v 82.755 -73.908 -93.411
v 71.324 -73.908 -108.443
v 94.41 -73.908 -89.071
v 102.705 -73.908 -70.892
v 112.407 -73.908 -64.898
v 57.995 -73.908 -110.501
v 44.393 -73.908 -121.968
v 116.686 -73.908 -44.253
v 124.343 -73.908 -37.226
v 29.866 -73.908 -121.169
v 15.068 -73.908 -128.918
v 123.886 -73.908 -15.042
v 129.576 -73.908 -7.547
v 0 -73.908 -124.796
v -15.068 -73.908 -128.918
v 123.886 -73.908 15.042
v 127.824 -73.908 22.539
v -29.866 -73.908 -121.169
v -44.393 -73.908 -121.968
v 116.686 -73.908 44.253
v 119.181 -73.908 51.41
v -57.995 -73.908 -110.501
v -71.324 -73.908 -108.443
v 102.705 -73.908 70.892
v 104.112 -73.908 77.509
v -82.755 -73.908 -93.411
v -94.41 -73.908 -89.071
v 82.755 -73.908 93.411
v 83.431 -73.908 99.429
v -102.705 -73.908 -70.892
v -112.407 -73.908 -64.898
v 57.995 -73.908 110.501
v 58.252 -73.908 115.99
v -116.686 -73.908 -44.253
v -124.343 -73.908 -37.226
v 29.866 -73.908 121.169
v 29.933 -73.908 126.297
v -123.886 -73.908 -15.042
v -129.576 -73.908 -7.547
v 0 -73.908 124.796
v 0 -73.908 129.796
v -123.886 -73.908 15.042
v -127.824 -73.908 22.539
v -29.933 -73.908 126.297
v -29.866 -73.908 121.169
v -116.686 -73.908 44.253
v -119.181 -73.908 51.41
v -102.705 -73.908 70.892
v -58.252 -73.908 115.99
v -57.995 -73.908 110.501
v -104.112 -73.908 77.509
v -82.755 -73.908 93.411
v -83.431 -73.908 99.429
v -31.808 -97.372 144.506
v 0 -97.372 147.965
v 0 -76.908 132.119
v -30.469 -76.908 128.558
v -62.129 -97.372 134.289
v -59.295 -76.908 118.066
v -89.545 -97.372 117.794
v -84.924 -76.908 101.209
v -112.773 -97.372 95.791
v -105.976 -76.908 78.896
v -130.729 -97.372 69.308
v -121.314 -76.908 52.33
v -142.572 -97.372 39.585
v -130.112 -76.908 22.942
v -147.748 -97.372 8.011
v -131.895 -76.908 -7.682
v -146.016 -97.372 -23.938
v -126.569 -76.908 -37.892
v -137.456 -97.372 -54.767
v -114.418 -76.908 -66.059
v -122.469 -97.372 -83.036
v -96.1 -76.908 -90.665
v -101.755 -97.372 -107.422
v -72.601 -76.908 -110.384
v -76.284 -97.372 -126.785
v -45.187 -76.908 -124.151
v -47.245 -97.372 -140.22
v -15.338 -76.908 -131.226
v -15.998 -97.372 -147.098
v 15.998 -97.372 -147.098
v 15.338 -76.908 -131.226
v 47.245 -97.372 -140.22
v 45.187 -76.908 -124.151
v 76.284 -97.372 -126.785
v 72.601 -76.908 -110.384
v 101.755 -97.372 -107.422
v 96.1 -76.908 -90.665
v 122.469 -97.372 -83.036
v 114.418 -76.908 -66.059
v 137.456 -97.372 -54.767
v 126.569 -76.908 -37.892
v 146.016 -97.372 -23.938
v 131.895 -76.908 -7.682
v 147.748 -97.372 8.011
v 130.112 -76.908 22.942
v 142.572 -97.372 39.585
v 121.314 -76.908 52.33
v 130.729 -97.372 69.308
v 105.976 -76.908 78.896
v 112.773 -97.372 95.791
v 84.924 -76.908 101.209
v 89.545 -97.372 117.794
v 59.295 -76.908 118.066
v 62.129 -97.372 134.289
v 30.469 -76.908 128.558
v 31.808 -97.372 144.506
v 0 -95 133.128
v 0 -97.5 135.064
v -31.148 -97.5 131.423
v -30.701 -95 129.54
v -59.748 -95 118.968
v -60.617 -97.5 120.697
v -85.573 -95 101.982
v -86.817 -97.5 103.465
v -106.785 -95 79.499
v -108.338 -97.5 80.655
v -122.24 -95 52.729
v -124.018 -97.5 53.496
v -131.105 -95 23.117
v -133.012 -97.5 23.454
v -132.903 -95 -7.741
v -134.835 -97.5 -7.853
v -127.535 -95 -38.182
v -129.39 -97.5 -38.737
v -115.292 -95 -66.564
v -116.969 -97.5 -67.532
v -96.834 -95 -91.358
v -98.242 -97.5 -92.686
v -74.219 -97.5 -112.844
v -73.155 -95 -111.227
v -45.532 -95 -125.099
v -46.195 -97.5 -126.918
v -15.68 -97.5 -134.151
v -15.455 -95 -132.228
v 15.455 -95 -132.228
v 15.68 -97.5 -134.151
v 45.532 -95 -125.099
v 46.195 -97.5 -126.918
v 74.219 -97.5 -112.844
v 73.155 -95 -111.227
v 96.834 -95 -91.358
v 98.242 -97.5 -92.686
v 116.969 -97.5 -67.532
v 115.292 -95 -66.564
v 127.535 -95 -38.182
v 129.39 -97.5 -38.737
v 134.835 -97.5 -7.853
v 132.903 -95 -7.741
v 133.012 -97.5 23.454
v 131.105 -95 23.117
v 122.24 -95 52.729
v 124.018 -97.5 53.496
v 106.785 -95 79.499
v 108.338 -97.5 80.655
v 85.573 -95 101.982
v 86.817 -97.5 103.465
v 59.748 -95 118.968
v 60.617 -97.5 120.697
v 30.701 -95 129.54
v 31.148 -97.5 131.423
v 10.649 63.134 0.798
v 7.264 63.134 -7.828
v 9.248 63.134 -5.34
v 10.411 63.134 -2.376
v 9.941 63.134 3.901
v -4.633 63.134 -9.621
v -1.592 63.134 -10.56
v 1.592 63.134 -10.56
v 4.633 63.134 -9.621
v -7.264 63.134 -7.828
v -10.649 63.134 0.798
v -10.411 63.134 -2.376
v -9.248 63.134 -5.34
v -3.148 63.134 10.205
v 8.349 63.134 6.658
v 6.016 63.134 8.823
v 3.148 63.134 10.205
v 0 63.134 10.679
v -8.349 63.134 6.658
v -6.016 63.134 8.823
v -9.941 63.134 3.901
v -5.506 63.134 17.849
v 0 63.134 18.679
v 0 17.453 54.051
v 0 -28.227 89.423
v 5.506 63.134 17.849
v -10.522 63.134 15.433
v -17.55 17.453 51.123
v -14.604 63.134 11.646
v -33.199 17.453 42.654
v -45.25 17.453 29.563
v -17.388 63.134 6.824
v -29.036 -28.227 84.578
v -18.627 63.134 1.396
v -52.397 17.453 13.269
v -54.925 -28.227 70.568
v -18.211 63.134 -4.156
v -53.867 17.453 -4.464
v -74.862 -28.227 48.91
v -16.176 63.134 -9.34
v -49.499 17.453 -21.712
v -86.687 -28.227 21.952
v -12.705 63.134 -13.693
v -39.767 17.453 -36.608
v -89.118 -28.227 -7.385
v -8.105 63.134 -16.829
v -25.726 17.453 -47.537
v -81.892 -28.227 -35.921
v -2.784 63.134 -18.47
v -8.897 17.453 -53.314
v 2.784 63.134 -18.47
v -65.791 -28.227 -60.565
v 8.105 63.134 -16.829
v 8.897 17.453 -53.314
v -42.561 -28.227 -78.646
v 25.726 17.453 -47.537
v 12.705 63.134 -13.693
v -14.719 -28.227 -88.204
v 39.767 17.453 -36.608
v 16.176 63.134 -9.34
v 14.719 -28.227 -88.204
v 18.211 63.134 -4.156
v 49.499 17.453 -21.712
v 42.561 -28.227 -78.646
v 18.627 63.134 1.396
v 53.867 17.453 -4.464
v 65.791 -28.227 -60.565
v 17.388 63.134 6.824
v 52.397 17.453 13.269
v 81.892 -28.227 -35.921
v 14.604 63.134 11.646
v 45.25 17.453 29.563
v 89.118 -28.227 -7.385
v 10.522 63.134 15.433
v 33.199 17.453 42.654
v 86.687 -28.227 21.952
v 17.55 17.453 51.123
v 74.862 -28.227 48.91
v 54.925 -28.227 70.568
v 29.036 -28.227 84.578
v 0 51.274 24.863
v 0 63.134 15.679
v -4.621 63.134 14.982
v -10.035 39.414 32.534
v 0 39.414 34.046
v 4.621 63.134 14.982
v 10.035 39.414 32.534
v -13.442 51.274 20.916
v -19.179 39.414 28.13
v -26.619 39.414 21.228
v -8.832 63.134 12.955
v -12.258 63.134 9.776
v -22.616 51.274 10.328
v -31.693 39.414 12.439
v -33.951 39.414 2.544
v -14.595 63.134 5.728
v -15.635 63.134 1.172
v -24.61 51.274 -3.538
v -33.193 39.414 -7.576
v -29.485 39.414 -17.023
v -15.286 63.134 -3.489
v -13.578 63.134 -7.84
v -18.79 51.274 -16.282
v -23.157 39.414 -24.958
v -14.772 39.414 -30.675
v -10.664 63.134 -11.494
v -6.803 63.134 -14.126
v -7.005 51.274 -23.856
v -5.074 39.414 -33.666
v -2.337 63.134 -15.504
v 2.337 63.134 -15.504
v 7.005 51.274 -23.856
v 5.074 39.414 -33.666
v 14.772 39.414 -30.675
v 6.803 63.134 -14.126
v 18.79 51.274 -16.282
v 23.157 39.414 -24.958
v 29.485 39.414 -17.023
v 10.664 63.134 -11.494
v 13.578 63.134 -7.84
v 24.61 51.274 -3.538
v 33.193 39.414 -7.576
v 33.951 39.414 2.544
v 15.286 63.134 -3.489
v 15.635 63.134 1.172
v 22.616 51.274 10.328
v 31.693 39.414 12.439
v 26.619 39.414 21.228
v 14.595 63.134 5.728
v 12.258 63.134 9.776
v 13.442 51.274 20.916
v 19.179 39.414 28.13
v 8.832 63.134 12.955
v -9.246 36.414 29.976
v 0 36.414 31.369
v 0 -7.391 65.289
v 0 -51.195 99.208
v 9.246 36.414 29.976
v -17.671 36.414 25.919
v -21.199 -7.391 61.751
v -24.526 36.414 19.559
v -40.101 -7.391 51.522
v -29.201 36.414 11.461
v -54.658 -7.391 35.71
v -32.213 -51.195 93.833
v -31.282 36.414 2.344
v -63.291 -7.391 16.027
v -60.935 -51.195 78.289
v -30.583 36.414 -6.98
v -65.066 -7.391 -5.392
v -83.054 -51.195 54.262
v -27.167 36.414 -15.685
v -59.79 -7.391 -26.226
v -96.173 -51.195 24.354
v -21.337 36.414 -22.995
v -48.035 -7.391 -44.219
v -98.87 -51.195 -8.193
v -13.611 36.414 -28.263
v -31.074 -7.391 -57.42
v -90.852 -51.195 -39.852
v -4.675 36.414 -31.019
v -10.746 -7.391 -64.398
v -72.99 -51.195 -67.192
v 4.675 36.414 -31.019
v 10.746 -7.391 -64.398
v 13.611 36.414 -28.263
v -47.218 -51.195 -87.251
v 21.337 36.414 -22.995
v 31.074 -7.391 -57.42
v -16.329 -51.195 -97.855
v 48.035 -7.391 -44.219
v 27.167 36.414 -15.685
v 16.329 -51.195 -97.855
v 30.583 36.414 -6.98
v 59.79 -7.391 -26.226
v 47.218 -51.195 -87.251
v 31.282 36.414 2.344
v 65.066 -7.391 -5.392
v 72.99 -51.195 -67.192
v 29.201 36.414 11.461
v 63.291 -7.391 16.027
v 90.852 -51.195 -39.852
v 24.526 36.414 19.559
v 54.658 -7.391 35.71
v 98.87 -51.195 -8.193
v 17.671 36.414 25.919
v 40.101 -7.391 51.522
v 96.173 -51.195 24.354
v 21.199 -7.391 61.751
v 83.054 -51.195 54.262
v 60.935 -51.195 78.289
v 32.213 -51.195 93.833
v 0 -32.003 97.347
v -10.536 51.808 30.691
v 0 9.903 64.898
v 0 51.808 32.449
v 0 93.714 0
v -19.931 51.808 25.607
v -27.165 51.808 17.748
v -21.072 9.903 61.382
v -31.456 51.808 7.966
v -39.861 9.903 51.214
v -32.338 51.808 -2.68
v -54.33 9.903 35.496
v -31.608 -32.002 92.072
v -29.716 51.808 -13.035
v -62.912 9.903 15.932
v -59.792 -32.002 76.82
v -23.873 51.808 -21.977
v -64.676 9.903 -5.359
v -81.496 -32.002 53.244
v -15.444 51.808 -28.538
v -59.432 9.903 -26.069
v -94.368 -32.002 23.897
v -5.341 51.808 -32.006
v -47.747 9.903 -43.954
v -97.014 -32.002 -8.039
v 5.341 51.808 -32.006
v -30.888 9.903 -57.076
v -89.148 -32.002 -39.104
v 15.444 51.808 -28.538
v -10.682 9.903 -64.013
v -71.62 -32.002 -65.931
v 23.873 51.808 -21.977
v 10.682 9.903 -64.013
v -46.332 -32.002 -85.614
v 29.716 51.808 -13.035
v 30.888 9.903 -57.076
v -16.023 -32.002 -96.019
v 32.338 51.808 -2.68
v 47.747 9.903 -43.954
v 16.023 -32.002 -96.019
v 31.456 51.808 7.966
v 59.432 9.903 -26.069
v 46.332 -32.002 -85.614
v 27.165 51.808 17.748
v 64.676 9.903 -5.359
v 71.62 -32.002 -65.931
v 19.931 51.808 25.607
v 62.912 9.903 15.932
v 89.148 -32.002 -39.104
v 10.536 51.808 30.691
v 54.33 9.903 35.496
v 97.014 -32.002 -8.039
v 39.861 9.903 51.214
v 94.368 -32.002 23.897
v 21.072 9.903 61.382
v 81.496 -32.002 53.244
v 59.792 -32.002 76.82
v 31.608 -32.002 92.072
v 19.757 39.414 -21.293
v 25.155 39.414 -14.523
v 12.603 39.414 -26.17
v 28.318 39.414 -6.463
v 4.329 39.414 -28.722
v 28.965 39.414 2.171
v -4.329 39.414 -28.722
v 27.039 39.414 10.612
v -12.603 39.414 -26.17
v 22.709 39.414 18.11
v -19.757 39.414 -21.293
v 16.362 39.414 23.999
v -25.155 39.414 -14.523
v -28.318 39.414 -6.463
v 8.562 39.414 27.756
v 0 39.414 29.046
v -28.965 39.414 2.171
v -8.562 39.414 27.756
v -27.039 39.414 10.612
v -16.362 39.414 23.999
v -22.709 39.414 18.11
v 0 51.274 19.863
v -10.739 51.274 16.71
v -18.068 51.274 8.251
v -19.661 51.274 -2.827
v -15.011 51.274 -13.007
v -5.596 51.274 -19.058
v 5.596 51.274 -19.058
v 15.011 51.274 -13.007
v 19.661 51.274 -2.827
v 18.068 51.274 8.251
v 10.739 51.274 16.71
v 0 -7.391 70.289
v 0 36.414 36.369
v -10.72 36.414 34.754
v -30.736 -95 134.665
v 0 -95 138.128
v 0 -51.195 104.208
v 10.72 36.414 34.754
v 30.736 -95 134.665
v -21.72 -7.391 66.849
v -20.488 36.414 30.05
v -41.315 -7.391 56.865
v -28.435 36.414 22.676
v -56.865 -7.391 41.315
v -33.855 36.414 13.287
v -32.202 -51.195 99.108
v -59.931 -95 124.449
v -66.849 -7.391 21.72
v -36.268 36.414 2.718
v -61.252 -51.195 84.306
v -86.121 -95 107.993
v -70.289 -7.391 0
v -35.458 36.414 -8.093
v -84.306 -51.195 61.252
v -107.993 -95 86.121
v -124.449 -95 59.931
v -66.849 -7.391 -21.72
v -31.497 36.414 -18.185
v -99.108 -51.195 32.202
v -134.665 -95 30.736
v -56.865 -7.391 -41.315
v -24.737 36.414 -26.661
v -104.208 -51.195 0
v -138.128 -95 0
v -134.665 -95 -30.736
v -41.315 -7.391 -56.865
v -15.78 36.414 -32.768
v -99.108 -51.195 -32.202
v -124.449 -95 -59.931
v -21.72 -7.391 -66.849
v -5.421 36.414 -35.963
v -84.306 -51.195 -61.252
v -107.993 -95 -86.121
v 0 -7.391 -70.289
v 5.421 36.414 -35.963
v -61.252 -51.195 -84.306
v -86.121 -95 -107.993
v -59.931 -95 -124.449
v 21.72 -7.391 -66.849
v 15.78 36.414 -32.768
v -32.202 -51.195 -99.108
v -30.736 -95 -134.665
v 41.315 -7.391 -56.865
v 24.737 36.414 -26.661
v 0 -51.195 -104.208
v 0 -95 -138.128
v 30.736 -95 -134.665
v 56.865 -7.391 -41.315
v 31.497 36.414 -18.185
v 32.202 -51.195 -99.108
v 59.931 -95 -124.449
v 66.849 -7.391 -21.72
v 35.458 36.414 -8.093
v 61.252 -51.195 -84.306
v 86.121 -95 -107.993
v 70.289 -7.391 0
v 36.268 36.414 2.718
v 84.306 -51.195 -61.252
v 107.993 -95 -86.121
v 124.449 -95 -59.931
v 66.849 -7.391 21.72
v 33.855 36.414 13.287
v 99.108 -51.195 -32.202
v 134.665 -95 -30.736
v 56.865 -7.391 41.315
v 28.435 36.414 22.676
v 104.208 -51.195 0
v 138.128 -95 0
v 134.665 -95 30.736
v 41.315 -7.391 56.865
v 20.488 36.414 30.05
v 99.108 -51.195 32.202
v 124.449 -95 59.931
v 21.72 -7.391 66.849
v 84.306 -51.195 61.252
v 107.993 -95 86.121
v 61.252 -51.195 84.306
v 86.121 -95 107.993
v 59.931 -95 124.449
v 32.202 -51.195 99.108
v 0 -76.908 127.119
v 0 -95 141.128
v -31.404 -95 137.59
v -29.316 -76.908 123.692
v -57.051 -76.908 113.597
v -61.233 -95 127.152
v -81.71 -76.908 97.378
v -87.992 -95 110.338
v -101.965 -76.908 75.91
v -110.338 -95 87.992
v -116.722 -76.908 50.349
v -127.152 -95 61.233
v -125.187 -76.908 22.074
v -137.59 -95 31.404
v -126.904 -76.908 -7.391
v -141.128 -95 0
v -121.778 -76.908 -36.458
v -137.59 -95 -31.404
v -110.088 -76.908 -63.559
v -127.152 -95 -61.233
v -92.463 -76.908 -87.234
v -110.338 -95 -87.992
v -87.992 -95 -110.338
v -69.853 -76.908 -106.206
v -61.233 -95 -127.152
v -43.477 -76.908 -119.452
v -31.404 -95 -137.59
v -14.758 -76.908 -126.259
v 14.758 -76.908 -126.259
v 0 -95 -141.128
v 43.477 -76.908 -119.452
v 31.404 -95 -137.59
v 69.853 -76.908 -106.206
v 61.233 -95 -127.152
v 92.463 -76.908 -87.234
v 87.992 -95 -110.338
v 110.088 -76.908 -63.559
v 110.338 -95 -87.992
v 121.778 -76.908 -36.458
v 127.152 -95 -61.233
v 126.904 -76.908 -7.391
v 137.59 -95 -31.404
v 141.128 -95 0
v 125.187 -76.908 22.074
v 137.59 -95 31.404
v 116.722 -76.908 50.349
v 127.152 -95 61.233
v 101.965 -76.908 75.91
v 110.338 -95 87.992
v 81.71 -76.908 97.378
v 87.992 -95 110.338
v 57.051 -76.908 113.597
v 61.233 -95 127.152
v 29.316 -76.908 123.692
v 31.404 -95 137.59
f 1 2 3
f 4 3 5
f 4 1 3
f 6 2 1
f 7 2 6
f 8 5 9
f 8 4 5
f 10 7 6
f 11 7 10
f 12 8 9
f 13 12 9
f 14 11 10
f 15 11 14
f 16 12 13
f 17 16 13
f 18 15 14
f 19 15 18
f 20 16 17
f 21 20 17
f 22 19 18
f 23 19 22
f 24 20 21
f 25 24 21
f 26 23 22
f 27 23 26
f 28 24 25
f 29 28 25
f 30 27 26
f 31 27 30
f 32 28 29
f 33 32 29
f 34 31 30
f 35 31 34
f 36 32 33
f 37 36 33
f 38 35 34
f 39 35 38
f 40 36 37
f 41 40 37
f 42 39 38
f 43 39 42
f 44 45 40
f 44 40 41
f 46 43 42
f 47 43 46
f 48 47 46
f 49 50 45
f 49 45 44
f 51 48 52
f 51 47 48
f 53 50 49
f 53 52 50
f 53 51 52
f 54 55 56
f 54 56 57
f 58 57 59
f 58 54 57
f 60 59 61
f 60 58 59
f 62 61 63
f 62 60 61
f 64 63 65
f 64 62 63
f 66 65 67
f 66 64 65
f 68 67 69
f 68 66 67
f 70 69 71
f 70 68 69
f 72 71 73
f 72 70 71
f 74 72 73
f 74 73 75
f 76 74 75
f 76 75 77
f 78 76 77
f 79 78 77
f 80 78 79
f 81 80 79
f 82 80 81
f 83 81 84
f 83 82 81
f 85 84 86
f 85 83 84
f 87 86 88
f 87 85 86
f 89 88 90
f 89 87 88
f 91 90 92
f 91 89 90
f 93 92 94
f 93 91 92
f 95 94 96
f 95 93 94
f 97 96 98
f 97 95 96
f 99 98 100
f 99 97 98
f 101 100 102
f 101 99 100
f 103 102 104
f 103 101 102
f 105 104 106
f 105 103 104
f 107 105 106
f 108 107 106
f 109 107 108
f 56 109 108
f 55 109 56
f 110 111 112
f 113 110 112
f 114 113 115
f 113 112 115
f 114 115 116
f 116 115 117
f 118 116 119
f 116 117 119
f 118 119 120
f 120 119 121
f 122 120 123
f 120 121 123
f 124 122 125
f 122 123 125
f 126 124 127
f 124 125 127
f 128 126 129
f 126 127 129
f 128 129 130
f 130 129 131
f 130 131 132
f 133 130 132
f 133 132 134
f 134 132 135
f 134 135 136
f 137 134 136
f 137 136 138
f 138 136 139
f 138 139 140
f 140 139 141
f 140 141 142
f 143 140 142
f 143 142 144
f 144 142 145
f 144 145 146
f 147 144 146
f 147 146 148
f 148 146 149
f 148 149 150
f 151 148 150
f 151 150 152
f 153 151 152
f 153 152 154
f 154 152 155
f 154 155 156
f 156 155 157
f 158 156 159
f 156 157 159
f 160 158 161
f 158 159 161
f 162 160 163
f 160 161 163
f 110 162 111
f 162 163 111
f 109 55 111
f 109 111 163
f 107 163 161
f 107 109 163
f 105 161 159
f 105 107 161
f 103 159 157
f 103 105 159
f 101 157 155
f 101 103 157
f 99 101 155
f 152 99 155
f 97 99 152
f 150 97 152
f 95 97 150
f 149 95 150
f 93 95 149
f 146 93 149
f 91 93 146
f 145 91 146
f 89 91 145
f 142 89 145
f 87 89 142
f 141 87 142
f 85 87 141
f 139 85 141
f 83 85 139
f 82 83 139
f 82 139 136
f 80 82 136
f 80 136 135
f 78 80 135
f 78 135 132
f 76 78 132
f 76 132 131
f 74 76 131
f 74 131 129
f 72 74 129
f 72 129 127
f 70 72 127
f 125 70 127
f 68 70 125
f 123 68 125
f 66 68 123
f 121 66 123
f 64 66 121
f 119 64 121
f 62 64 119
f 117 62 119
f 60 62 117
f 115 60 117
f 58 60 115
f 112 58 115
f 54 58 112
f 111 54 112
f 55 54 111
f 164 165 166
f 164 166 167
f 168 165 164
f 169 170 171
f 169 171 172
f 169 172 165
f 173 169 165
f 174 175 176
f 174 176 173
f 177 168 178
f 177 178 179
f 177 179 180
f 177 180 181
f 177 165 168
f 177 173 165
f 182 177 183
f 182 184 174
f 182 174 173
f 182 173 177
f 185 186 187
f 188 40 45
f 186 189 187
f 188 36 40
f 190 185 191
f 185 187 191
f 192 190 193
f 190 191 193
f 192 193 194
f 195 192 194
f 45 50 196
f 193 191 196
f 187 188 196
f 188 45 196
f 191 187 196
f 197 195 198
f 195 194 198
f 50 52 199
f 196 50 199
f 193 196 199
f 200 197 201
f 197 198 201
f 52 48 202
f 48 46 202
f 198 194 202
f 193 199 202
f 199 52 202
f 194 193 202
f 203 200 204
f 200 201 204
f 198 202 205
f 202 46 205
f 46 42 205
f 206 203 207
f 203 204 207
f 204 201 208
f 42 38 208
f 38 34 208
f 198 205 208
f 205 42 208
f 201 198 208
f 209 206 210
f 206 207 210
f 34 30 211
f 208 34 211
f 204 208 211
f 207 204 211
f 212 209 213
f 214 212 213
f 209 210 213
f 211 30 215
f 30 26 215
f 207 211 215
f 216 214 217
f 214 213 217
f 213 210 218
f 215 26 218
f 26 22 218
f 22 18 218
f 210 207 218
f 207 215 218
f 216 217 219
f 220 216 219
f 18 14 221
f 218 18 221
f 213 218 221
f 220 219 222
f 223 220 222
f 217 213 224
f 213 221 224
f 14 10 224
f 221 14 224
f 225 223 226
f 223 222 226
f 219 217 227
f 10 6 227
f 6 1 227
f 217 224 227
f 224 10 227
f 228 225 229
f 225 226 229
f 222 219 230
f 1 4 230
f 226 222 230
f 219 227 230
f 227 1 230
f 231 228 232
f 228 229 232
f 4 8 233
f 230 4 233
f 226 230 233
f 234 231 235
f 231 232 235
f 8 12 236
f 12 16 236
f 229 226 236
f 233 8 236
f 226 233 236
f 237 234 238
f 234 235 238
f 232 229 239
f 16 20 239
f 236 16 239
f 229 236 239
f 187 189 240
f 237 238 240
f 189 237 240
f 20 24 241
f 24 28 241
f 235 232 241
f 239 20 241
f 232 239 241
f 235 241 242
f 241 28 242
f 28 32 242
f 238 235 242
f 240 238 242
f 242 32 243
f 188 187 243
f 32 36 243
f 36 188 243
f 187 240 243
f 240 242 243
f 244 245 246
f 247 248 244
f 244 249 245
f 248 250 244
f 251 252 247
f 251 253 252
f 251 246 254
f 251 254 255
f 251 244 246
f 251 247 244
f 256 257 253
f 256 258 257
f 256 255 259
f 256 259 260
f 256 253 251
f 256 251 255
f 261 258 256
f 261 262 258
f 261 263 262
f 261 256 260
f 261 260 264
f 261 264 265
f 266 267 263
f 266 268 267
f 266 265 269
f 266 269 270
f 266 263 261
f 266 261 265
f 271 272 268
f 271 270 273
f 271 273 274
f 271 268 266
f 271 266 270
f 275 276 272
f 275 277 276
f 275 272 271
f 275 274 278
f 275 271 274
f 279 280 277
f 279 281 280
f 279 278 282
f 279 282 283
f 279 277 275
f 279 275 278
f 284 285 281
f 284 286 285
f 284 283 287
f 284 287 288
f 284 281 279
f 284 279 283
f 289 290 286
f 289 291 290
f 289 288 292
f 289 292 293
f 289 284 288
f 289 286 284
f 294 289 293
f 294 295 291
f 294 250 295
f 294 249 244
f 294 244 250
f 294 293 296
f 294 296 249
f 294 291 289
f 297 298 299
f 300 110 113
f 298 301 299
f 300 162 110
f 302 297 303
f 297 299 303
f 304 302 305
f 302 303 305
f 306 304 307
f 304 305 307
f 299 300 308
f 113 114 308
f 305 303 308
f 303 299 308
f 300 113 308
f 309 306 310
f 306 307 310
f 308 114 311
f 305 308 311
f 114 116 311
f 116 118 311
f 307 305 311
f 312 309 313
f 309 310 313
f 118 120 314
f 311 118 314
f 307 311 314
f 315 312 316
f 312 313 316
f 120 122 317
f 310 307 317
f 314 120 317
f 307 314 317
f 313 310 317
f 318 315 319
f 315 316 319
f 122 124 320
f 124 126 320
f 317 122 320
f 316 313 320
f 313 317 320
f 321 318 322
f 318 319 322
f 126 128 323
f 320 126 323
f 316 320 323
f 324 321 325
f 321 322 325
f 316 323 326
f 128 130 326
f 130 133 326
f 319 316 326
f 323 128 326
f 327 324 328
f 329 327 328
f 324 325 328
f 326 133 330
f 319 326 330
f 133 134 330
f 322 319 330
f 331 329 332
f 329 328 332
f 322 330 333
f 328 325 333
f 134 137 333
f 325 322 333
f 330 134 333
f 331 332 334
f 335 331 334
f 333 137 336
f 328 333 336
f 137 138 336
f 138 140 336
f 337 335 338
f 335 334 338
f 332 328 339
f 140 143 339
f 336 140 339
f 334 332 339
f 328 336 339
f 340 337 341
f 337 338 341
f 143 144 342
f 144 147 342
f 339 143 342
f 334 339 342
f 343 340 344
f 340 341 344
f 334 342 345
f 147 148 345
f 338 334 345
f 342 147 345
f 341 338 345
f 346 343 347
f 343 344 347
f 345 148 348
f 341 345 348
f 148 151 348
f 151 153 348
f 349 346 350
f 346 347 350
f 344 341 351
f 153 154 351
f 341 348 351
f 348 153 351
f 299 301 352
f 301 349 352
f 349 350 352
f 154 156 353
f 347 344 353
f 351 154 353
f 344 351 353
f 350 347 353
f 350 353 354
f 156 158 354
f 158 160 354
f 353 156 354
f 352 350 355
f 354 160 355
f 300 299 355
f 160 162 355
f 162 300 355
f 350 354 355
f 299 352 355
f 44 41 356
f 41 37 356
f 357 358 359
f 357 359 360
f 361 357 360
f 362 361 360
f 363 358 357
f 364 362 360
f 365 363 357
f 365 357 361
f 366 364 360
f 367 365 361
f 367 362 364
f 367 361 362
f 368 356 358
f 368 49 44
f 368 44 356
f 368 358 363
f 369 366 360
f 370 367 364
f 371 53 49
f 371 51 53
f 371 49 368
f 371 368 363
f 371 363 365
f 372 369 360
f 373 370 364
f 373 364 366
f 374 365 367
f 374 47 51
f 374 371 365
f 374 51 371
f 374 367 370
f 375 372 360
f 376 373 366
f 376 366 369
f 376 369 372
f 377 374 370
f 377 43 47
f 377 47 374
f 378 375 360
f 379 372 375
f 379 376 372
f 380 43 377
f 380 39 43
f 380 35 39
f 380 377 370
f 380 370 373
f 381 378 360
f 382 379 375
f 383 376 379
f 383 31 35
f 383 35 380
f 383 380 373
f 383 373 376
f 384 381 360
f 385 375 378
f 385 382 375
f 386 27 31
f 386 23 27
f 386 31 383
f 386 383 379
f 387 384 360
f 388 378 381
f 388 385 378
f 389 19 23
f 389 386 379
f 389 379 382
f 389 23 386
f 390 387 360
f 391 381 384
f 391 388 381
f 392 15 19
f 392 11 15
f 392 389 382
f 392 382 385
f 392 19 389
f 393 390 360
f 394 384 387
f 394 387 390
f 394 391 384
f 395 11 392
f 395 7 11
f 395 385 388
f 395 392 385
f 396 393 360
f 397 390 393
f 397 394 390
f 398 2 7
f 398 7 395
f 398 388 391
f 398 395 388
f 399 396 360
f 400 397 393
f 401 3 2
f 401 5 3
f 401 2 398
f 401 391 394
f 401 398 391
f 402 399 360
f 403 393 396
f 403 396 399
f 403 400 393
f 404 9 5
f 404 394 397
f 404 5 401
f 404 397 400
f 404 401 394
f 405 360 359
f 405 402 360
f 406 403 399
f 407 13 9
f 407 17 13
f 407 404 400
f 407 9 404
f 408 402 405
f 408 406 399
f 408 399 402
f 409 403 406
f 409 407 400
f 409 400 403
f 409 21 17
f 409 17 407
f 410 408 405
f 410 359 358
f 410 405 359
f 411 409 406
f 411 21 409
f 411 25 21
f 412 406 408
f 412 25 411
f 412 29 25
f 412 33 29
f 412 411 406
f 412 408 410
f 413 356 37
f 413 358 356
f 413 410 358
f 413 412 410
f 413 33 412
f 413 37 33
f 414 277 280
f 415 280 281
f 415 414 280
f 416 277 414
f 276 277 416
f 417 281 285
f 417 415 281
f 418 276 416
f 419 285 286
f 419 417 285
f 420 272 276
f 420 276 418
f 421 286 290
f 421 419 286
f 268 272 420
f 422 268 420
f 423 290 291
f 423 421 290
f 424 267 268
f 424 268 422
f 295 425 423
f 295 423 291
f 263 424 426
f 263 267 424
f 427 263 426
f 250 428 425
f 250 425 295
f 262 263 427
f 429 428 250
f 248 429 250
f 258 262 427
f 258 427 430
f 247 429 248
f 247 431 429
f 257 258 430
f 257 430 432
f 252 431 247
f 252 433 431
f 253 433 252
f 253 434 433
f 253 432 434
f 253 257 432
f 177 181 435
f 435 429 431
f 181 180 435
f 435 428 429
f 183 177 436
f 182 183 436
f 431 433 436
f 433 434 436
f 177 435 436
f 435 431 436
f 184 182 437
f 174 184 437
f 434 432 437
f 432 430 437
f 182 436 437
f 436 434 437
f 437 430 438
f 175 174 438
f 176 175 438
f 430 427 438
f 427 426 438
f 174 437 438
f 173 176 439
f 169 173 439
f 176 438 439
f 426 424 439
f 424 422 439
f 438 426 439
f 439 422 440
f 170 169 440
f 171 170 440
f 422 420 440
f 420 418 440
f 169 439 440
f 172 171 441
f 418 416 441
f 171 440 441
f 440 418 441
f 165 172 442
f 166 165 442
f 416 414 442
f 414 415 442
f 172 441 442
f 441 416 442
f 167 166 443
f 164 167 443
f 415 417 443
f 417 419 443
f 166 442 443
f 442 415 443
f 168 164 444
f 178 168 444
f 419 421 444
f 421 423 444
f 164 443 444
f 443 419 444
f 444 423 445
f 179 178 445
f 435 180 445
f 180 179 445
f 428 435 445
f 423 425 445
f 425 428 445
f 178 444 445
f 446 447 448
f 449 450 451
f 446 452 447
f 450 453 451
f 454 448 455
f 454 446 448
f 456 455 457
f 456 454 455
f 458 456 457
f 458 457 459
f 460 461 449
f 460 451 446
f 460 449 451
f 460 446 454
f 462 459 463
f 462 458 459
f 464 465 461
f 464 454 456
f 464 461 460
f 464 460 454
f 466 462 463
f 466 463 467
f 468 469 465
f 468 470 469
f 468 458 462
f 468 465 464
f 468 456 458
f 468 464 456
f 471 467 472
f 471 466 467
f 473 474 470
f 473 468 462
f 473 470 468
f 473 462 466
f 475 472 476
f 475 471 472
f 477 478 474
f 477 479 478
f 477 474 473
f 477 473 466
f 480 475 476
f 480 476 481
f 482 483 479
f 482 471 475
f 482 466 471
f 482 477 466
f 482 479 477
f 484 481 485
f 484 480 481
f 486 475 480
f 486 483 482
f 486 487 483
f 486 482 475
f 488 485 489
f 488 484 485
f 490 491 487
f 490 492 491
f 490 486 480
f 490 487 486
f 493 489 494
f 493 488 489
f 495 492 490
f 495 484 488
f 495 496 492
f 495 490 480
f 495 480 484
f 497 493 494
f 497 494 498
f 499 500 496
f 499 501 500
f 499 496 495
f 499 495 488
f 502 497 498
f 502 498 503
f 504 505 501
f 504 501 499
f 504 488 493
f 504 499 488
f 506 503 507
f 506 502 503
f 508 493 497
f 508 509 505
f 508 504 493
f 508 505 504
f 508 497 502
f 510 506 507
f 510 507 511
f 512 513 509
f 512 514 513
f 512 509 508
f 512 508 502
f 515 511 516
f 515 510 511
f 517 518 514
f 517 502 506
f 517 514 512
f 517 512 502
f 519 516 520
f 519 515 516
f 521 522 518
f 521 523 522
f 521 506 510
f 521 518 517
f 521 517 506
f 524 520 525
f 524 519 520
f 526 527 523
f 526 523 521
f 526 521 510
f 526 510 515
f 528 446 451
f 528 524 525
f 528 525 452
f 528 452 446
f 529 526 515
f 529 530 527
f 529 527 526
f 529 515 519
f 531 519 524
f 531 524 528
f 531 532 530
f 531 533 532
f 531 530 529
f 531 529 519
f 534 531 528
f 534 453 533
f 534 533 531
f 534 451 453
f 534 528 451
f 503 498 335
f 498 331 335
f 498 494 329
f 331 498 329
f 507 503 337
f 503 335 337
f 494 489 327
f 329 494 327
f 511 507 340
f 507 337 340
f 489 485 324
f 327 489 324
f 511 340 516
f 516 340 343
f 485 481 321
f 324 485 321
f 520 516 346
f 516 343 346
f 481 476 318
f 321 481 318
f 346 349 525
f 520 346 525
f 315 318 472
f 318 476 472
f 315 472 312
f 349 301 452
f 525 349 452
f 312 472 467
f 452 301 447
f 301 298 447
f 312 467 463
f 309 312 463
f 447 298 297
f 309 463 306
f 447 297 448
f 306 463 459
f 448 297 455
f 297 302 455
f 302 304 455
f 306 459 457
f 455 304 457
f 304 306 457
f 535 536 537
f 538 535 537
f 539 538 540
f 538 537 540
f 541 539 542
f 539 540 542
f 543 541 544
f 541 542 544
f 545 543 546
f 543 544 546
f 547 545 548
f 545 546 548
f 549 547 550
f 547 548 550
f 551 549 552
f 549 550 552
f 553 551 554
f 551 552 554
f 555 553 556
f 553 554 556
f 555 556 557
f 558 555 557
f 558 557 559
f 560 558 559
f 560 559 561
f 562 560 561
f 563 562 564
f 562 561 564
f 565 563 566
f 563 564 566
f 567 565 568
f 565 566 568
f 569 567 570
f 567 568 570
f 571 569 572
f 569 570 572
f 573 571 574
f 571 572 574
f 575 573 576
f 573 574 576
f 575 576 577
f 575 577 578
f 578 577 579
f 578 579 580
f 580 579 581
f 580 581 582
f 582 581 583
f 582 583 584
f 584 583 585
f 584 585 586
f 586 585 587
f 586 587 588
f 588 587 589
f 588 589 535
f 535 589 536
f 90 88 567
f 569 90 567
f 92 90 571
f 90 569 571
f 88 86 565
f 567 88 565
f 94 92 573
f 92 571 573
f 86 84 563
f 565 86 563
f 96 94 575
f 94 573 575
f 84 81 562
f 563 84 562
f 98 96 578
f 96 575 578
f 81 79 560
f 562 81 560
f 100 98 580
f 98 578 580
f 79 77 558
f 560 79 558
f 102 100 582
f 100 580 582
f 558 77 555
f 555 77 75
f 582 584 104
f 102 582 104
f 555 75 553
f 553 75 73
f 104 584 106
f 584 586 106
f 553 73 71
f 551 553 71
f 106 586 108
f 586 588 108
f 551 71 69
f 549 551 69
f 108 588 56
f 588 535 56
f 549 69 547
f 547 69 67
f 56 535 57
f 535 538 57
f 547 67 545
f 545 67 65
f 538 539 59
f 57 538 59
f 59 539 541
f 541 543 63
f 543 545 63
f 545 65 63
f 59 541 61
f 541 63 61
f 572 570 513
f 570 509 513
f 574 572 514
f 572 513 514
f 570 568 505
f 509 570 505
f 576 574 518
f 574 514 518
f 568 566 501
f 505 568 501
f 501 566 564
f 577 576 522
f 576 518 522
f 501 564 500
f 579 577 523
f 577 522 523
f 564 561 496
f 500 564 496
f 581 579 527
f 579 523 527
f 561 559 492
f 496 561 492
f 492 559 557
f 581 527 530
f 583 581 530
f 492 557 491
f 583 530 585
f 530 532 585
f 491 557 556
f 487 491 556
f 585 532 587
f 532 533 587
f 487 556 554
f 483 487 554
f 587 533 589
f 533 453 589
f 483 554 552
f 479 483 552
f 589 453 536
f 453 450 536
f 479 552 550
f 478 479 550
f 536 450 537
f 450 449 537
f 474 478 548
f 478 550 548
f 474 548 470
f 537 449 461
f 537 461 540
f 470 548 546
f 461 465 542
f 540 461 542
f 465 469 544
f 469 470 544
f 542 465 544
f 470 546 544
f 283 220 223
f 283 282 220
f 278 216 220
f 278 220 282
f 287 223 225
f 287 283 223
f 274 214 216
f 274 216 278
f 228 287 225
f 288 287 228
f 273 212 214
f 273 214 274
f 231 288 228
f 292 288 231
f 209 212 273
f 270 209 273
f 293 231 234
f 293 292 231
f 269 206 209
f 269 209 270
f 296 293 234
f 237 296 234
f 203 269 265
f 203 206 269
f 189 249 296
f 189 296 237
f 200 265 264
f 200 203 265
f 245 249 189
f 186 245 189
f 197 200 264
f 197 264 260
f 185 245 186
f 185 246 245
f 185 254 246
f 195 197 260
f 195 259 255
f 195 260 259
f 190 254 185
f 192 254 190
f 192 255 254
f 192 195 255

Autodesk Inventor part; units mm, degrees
ref_plane "YZ Plane" through (0, 0, 0) normal (1, 0, 0) x (0, 1, 0)
ref_plane "XZ Plane" through (0, 0, 0) normal (0, 1, 0) x (-1, 0, 0)
ref_plane "XY Plane" through (0, 0, 0) normal (0, 0, 1) x (1, 0, 0)
sketch "Sketch1" plane through (0, 0, 0) normal (1, 0, 0) x (0, 1, 0)
  line L0 (0, 0) -> (150, 0)
  line L1 (150, 0) -> (-150, 0)
  line L2 (0, 0) -> (-100, 0)
  line L3 (-100, 0) -> (-100, 150)
  line L4 (-100, 0) -> (-95, 0)
  line L5 (63.1336, 18.679) -> (63.1336, 0)
  line L6 (-95, 141.128) -> (-95, 138.128)
  line L7 (63.1336, 15.679) -> (63.1336, 10.679)
  line L8 (63.1336, 10.679) -> (39.4136, 29.0464)
  line L9 (-100, 150) -> (-76.9079, 132.1189)
  line L10 (-73.9079, 129.7959) -> (93.7137, 0)
  line L11 (-95, 141.128) -> (-76.9079, 127.1186)
  line L12 (-73.9079, 124.7956) -> (63.1336, 18.679)
  line L13 (-73.9079, 129.7959) -> (-73.9079, 124.7956)
  line L14 (-76.9079, 129.7959) -> (-76.9079, 127.1186)
  line L15 (-76.9079, 127.1186) -> (-76.9079, 132.1189)
  line L16 (-95, 138.128) -> (36.4136, 36.3694)
  line L17 (39.4136, 34.0464) -> (63.1336, 15.679)
  line L18 (36.4136, 36.3694) -> (36.4136, 31.3694)
  line L19 (39.4136, 29.0464) -> (39.4136, 34.0464)
  line L20 (39.4136, 29.0464) -> (39.4136, 34.0464)
  line L21 (63.1336, 10.679) -> (39.4136, 29.0464)
  line L22 (36.4136, 31.3694) -> (-95, 133.128)
  line L23 (-95, 141.128) -> (-95, 146.1283)
  line L24 (-100, 150) -> (-95, 146.1283)
  line L25 (-95, 146.1283) -> (-96.8631, 147.571)
  line L26 (-95, 146.1283) -> (-97.372, 147.965)
  line L27 (-97.372, 147.965) -> (-97.5, 135.0638)
  line L28 (-97.5, 135.0638) -> (-95, 133.128)
  line L29 (-95, 141.128) -> (-95, 138.128)
  line L30 (-95, 141.128) -> (-95, 138.128)
  line L31 (-95, 0) -> (-95, 133.128)
  line L32 (-95, 138.128) -> (-95, 141.128)
  dimension "d0" = 150
  dimension "d1" = 300
  dimension "d2" = 100
  dimension "d3" = 150
  dimension "d4" = 245
  dimension "d5" = 5
  dimension "d6" = 141.128
  dimension "d7" = 200
  dimension "d8" = 3
  dimension "d9" = 5
  dimension "d12" = 30
  dimension "d15" = 3
ref_plane "Work Plane1" through (0, 93.7137, 0) normal (0, 1, 0) x (-1, 0, 0)
ref_plane "Work Plane2" through (0, 93.7137, 0) normal (1, 0, 0) x (0, -0.7907, 0.6122)
revolve "Revolution1" add sketch "Sketch1" angle 360 about axis through (0, 0, 0) along (0, -1, 0) contours L5 L12 L13 L10 L0 | L8 L19 L17 L5 | L28 L27 L9 L23 L6 L16 L18 L22 | L9 L15 L14 L11 L23
properties part number "Tree Model-Om Mihani"
